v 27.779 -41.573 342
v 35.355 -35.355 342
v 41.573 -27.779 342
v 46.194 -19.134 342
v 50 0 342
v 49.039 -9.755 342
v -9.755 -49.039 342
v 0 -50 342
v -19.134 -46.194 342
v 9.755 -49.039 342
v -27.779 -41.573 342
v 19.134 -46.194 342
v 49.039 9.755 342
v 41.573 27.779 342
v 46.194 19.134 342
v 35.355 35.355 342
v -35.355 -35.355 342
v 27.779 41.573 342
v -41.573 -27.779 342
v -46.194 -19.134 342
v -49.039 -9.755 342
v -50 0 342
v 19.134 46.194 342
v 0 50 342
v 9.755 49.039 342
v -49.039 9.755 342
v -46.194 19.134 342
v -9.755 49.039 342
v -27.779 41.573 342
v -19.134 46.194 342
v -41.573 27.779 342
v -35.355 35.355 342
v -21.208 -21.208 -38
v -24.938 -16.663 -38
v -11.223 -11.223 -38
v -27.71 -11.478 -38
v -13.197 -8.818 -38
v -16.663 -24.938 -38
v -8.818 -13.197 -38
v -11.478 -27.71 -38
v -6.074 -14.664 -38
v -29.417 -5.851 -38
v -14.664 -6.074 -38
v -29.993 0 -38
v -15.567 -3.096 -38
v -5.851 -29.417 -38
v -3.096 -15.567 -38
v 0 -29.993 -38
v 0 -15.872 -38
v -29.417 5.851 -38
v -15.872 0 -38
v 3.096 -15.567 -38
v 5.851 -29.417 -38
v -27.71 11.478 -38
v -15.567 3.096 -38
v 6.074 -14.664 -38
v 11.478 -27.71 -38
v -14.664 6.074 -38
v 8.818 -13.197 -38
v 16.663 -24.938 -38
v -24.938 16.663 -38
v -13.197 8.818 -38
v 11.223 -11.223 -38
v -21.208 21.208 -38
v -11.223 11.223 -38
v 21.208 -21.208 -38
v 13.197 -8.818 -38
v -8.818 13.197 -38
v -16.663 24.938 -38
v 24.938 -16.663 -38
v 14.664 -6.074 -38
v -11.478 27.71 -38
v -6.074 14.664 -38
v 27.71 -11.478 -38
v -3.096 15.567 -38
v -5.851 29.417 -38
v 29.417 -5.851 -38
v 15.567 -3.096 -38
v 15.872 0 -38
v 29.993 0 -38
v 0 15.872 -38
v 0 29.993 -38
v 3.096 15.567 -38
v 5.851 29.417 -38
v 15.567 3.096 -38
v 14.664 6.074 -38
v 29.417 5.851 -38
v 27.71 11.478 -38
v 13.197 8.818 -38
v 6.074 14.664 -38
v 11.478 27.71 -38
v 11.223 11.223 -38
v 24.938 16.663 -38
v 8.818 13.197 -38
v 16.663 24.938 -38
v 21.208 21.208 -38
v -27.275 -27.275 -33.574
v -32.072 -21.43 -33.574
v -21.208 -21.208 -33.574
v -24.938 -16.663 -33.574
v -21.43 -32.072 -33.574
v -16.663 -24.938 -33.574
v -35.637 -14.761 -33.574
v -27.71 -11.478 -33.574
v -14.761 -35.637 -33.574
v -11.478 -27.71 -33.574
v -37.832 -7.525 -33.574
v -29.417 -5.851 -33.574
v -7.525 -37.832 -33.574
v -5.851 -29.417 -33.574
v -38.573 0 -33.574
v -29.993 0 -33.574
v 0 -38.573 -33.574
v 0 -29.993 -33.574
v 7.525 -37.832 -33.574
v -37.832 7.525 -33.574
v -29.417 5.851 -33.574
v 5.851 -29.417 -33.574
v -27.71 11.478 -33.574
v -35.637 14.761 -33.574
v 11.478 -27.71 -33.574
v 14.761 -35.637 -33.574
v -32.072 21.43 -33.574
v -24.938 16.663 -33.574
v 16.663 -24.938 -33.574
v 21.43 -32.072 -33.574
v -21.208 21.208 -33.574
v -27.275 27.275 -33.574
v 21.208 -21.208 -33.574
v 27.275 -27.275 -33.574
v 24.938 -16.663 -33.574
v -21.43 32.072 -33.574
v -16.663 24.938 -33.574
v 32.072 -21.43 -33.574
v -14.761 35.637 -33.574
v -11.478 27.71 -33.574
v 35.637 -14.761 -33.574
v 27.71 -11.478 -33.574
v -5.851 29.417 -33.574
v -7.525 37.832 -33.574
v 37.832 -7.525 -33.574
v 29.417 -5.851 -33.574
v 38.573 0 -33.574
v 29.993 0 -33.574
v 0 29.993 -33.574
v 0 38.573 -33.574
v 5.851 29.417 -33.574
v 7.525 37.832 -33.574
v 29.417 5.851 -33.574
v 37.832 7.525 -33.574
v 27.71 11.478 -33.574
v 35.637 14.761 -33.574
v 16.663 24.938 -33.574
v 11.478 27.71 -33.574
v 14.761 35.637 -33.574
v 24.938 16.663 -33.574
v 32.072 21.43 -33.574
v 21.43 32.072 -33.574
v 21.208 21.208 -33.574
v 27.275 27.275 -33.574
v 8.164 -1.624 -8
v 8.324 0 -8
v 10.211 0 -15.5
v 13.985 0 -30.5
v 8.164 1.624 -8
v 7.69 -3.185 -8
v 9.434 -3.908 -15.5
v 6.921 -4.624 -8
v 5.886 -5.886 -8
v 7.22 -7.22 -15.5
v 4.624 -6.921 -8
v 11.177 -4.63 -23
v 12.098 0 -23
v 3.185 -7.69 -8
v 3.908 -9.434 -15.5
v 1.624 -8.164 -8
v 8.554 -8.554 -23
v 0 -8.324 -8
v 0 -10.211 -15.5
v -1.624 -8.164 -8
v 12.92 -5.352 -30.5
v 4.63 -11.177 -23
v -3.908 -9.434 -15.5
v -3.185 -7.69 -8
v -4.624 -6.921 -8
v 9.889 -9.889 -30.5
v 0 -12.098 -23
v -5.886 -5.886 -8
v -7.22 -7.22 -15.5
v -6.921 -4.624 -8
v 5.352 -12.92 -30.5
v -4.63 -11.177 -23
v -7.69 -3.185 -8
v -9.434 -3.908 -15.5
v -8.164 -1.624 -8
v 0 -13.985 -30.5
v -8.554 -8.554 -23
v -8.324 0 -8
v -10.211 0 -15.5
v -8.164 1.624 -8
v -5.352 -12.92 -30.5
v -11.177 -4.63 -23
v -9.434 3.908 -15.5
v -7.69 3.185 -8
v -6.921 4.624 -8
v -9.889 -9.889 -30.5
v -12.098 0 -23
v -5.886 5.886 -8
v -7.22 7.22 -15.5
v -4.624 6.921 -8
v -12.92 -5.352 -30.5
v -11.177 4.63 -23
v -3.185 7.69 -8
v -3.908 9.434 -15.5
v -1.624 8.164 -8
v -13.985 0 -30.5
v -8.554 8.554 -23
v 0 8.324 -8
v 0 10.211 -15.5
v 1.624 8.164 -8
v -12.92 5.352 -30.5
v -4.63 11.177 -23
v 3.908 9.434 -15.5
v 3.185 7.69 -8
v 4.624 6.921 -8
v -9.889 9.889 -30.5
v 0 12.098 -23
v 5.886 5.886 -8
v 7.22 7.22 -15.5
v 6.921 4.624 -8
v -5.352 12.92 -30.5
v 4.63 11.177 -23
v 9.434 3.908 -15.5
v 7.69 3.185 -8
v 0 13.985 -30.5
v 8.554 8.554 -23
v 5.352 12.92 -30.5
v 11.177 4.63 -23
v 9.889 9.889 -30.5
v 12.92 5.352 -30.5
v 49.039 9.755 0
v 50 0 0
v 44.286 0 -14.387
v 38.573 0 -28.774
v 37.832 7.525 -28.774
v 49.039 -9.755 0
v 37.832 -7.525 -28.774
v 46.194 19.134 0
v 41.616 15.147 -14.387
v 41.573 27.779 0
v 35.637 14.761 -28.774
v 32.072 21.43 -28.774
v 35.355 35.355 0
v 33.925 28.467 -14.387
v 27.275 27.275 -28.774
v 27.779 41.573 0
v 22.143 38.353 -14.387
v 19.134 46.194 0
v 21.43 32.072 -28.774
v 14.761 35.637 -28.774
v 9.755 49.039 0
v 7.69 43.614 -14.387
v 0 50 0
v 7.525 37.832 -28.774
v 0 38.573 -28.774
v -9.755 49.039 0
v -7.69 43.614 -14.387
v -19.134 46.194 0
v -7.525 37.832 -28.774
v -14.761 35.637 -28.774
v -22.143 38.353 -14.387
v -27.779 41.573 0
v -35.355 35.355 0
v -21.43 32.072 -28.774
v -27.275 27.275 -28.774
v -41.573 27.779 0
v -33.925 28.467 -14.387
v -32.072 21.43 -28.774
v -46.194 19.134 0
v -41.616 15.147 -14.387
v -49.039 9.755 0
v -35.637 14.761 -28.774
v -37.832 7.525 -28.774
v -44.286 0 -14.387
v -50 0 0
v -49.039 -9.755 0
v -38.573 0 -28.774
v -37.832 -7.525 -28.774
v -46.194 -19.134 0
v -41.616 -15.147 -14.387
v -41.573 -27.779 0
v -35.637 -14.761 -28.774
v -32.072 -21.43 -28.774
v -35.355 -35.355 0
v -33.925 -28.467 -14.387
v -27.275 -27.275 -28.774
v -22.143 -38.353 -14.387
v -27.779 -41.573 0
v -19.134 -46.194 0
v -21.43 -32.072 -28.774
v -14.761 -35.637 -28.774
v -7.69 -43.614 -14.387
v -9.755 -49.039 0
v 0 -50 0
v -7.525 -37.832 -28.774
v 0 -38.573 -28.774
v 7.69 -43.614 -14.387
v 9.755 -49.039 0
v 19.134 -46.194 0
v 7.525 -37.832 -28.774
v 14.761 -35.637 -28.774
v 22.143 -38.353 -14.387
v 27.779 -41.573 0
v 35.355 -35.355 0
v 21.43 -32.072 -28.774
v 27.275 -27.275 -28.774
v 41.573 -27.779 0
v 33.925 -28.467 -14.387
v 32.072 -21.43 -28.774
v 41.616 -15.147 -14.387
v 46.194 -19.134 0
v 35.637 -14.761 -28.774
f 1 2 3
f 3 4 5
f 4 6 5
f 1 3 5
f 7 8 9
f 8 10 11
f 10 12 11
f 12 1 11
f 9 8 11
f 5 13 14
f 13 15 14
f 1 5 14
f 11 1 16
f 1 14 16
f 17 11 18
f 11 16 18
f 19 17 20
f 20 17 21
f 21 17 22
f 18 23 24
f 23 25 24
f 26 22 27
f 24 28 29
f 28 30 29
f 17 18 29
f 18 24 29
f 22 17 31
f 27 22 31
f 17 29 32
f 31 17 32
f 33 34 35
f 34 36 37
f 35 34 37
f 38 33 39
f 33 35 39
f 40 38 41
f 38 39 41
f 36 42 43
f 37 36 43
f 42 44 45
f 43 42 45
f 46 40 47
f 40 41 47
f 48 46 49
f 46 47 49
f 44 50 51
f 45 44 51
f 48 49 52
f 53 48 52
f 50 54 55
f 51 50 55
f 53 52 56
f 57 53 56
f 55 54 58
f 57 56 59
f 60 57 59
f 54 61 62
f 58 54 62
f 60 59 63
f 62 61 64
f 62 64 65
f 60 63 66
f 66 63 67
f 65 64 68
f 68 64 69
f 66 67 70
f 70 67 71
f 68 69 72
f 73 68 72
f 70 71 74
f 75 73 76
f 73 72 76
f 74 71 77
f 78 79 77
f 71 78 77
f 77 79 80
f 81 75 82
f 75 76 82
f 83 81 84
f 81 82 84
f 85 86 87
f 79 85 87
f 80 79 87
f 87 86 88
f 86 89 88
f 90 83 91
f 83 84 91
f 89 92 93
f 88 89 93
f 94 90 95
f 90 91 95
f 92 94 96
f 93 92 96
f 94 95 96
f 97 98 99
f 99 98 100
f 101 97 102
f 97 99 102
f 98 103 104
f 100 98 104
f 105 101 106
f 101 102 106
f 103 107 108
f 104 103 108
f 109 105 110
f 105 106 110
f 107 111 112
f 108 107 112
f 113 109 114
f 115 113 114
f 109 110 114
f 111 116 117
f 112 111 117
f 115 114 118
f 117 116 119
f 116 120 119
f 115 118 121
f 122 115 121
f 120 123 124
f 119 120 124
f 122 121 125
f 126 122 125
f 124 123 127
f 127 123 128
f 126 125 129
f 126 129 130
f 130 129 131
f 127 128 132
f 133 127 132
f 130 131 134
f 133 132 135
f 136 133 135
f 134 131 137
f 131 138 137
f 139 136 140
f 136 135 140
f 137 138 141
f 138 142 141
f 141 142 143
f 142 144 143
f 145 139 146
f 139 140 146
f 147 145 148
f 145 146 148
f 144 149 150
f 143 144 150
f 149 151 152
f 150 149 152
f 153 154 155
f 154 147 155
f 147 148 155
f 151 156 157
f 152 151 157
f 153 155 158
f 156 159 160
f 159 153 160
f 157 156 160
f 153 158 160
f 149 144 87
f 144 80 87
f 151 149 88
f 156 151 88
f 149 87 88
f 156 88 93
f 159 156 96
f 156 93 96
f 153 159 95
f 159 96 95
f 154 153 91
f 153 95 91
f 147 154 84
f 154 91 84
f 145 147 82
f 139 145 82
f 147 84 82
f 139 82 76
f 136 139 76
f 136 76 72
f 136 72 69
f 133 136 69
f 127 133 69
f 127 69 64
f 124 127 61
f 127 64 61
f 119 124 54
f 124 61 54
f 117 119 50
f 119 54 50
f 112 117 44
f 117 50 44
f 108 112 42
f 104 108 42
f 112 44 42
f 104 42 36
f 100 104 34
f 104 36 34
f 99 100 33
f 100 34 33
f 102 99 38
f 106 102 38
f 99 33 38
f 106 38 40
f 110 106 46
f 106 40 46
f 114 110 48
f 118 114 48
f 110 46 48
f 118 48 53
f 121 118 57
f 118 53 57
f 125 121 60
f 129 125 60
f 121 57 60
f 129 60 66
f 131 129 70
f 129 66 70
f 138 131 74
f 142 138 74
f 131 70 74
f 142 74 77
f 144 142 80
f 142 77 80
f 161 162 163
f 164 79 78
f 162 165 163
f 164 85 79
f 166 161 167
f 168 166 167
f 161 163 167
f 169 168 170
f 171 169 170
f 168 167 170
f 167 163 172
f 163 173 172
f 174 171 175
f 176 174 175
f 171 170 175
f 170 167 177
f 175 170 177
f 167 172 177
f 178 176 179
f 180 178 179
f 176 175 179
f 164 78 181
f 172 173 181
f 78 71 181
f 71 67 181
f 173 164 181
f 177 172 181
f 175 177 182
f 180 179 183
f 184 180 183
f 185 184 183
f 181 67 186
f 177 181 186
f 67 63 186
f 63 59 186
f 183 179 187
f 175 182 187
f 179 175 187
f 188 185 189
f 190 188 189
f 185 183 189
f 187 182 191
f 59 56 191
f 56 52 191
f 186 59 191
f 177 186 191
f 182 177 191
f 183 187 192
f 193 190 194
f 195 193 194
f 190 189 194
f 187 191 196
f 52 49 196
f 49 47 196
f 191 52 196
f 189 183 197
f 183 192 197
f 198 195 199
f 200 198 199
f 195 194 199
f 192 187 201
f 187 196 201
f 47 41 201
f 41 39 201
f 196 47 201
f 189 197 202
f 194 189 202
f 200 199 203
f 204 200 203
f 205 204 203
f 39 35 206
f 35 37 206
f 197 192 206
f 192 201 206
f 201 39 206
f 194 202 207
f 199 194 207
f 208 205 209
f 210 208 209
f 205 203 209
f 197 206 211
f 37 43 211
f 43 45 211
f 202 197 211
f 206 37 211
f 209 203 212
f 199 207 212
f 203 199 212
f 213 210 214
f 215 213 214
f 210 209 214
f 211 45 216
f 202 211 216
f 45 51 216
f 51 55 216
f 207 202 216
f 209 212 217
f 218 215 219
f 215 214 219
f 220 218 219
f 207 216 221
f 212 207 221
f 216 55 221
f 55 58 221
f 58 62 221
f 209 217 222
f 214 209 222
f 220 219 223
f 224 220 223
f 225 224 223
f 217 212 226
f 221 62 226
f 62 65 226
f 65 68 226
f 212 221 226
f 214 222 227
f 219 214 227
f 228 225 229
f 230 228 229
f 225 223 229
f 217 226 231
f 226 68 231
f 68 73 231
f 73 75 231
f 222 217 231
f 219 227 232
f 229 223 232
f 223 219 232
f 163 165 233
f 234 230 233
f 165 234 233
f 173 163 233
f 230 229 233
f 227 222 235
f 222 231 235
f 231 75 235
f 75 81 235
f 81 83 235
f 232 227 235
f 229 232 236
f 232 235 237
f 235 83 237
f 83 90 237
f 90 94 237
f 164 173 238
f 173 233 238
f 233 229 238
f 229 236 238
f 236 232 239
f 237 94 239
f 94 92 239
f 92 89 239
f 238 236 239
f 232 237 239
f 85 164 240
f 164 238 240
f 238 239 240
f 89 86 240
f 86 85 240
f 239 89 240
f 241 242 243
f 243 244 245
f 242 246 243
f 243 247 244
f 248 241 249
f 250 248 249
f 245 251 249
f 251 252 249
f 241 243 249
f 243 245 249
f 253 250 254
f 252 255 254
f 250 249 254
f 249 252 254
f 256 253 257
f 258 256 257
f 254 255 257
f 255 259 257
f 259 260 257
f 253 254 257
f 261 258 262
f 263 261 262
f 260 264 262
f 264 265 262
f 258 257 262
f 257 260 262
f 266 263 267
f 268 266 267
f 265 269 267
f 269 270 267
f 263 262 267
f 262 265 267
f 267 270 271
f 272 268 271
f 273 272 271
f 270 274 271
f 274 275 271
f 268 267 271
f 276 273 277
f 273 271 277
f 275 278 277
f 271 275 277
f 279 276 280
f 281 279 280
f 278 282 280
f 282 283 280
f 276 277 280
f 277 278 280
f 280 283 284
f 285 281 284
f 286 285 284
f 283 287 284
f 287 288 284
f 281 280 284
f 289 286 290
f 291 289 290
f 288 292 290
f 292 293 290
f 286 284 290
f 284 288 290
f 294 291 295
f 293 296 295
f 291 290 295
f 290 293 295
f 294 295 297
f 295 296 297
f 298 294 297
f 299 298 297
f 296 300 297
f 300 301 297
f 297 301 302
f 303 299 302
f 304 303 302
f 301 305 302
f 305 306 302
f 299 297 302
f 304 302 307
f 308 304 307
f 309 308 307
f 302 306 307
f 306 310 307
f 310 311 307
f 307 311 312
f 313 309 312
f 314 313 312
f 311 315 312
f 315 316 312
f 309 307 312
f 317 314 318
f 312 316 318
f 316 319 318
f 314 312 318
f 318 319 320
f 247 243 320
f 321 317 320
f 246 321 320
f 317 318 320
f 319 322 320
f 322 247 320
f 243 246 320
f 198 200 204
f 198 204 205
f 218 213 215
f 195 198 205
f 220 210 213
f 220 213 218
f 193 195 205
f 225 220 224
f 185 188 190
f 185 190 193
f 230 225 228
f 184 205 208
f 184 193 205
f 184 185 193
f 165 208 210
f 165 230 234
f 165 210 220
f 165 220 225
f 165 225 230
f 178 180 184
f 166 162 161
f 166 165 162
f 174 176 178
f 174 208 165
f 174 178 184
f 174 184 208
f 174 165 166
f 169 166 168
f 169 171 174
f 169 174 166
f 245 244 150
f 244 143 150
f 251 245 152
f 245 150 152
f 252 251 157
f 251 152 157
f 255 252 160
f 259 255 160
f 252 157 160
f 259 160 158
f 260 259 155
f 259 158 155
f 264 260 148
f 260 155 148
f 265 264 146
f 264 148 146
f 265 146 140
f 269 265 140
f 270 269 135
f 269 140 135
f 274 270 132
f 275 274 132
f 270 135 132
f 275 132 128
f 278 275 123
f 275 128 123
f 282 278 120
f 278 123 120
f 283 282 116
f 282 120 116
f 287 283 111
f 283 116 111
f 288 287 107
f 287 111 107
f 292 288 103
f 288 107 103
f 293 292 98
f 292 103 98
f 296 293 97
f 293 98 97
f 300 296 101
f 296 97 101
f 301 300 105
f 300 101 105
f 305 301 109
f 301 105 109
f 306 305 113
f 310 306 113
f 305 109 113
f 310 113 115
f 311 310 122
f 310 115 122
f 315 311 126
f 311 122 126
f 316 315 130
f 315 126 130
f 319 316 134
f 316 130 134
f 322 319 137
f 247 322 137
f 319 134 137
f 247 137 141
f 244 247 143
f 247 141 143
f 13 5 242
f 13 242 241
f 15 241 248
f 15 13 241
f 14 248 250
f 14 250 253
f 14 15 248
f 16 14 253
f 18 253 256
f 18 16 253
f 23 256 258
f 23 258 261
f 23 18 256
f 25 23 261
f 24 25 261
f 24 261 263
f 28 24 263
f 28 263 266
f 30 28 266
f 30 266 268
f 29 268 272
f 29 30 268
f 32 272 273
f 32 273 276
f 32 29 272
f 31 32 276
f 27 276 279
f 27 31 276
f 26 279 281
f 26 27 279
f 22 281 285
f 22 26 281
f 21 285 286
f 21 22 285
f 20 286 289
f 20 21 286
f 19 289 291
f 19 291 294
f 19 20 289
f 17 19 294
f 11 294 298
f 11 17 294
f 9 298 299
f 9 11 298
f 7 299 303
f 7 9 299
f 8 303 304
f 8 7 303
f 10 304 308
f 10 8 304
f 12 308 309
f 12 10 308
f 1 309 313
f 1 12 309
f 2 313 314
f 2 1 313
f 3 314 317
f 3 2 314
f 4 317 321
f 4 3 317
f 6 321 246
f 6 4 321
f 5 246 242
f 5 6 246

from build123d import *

# Parameters (mm, degrees)
SKETCH_W    = 50
SKETCH_H    = 342
SKETCH003_R = 8.323834
SKETCH002_R = 15.87187


with BuildPart() as part:
    # Sketch → Revolution (revolve)
    with BuildSketch(Plane.XZ):
        with Locations((25, 171)):
            Rectangle(SKETCH_W, SKETCH_H)
    revolve(axis=Axis((0, 0, 0), (0, 0, 1)))

    # Sketch001 → Revolution001 (revolve)
    with BuildSketch(Plane.XZ):
        Polygon((50, 0), (38.572964, -28.773746), (38.572964, -33.573742), (29.993038, -33.573742), (29.993038, -38), (0, -38), (0, 0), align=None)
    revolve(axis=Axis((0, 0, 0), (0, 0, 1)))

    # Sketch003 (on DatumPlane) → SubtractiveLoft section 0
    with BuildSketch(Plane(origin=(0, 0, -8), x_dir=(1, 0, 0), z_dir=(0, 0, -1))):
        Circle(SKETCH003_R)
    # Sketch002 (on Face7 of Revolution001) → SubtractiveLoft section 1
    with BuildSketch(Plane(origin=(0, 0, -38), x_dir=(1, 0, 0), z_dir=(0, 0, -1))):
        Circle(SKETCH002_R)
    loft(mode=Mode.SUBTRACT)


solid = part.part
